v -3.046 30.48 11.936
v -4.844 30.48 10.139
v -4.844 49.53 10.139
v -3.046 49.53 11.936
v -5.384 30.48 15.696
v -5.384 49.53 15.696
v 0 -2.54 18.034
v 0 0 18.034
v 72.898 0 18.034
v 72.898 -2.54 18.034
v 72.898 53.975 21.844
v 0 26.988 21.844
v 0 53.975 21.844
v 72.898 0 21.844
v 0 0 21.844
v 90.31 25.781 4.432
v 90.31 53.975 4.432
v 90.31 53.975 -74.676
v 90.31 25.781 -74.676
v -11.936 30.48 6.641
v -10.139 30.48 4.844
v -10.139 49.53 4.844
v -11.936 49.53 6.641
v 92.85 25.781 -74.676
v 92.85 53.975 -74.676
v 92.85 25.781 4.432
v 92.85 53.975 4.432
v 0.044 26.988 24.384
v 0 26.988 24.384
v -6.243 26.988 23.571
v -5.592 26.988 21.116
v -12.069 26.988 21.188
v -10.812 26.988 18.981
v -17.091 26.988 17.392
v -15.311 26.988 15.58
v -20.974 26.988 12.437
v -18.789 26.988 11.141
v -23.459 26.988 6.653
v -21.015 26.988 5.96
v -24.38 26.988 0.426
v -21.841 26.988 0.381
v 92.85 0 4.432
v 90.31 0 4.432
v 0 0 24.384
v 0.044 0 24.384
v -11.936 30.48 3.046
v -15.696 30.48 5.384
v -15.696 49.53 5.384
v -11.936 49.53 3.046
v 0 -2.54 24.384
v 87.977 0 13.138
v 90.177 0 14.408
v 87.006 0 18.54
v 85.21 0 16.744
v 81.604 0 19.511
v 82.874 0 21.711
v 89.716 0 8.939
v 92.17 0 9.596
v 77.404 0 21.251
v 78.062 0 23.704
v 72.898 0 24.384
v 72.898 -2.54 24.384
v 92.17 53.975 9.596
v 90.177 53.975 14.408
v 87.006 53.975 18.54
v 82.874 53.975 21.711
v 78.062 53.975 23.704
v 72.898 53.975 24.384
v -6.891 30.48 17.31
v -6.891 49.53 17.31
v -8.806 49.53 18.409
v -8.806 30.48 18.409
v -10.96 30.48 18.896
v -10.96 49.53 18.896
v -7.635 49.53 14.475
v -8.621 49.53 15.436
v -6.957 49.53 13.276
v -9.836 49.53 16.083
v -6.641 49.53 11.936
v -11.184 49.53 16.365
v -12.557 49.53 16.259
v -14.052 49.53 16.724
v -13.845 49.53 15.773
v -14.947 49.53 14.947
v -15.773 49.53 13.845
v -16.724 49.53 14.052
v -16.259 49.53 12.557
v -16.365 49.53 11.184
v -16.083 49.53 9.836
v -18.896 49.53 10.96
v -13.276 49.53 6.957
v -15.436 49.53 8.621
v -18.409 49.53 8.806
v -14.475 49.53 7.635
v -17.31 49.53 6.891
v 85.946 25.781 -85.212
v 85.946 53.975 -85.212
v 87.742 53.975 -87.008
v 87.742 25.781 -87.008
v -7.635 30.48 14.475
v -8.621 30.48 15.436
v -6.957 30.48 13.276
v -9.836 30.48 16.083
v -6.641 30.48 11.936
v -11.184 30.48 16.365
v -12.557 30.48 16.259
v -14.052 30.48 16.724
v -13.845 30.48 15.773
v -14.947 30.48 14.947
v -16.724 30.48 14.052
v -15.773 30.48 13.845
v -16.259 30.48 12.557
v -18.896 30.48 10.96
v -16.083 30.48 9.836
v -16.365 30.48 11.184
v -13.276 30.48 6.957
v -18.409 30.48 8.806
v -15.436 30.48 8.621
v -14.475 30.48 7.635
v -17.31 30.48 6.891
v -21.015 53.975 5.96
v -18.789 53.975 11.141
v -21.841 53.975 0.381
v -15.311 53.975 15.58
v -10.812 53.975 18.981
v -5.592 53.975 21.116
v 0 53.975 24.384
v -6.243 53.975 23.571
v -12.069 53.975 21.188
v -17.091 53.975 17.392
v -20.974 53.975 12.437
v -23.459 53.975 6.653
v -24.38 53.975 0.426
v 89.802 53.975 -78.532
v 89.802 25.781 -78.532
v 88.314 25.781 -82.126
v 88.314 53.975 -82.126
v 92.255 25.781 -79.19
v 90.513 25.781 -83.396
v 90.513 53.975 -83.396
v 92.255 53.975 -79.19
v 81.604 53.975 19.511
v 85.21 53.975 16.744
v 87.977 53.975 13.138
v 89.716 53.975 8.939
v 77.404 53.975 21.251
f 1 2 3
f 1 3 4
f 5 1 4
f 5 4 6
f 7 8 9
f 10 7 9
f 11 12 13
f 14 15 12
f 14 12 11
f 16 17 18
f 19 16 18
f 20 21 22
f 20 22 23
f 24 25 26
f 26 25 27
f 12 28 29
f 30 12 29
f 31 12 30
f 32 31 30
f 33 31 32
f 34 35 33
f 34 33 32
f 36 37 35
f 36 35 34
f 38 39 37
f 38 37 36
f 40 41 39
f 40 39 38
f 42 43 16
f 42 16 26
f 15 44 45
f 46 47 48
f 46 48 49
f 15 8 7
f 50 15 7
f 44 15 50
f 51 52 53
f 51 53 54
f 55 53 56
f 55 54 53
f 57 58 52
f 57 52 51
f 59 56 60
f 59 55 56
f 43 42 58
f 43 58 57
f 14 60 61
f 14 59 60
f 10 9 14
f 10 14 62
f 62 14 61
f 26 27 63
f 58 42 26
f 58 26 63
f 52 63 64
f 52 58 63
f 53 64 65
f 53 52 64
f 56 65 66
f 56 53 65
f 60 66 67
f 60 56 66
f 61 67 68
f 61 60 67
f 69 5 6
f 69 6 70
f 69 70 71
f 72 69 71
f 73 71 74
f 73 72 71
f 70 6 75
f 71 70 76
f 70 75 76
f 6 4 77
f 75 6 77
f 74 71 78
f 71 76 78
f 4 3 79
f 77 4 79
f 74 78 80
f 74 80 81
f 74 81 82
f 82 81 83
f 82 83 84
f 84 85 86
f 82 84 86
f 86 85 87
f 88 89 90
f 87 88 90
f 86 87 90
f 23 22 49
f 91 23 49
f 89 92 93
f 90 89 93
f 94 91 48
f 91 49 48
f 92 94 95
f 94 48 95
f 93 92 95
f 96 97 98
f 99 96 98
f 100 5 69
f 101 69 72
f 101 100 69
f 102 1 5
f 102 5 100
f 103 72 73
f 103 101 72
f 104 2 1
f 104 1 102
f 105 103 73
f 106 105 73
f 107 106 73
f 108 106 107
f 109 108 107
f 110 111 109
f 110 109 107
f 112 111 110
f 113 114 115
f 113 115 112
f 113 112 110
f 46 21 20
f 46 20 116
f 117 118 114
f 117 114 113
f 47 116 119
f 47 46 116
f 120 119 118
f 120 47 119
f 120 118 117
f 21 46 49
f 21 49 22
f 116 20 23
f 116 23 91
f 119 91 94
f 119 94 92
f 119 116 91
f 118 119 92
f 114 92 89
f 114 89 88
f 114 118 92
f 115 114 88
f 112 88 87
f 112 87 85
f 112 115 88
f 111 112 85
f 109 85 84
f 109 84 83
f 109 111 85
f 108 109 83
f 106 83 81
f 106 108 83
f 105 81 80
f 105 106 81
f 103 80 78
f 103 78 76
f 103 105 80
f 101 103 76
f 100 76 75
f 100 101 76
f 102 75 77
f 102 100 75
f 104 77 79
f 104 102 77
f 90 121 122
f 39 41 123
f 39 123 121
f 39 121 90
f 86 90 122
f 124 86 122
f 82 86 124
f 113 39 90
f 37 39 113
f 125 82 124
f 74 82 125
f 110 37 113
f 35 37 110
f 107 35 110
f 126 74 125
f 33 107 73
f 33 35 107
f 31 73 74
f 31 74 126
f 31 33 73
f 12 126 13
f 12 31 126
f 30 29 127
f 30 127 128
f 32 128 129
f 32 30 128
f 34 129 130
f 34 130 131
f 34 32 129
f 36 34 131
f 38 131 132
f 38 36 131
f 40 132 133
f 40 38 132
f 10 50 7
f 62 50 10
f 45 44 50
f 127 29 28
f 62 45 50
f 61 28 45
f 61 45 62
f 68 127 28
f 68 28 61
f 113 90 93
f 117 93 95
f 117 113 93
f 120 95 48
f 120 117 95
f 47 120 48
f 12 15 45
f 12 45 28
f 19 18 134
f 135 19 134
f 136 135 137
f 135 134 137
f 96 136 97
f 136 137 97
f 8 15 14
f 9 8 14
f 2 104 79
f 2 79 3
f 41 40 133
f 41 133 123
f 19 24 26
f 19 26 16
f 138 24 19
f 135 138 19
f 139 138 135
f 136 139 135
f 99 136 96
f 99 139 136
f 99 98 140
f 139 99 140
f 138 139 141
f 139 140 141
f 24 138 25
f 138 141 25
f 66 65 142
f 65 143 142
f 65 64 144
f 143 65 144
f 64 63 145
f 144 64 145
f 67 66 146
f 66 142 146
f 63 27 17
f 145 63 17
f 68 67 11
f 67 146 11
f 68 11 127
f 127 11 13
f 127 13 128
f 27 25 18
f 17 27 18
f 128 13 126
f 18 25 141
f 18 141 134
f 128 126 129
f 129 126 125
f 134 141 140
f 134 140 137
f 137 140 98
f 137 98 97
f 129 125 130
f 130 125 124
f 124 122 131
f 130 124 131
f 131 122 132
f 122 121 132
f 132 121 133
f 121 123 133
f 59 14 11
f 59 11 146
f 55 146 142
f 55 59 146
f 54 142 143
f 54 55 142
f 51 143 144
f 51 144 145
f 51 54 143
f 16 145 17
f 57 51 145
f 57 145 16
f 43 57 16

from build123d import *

# Parameters (mm, degrees)
EXTRUDE_THIN1_DEPTH = 53.975
BOSS_EXTRUDE1_START = 30.48
BOSS_EXTRUDE1_DEPTH = 19.05
SKETCH12_W          = 34.867415814
SKETCH12_H          = 30.456007234
CUT_EXTRUDE1_DEPTH  = 27.000736901
BOSS_EXTRUDE2_DEPTH = 28.194
SKETCH15_W          = 72.898
SKETCH15_H          = 6.35
BOSS_EXTRUDE3_DEPTH = 2.54


with BuildPart() as part:
    # Sketch8 → Extrude-Thin1 (new body)
    with BuildSketch(Plane(origin=(0, 0, 0), x_dir=(1, 0, 0), z_dir=(0, 1, 0))):
        with BuildLine():
            ThreePointArc((-21.840673053, -0.381230366), (-15.310661969, -15.580242811), (0, -21.844))
            Line((0, -21.844), (72.898, -21.844))
            ThreePointArc((72.898, -21.844), (85.209931142, -16.744231142), (90.3097, -4.4323))
            Line((90.3097, -4.4323), (92.8497, -4.4323))
            ThreePointArc((92.8497, -4.4323), (87.005982366, -18.540282366), (72.898, -24.384))
            Line((72.898, -24.384), (0, -24.384))
            ThreePointArc((0, -24.384), (-17.090971501, -17.391898952), (-24.380286199, -0.425559479))
            Line((-24.380286199, -0.425559479), (-21.840673053, -0.381230366))
        make_face()
    extrude(amount=EXTRUDE_THIN1_DEPTH)

    # Sketch10 → Boss-Extrude1 (add)
    with BuildSketch(Plane(origin=(0, 0, 0), x_dir=(1, 0, 0), z_dir=(0, 1, 0)).offset(BOSS_EXTRUDE1_START)):
        with BuildLine():
            Line((-6.641231784, -11.936352934), (-4.843541474, -10.138662625))
            Line((-4.843541474, -10.138662625), (-3.045851165, -11.936352934))
            Line((-3.045851165, -11.936352934), (-5.383859486, -15.696211745))
            ThreePointArc((-5.383859486, -15.696211745), (-7.807213542, -17.931410627), (-10.959862847, -18.895548216))
            ThreePointArc((-10.959862847, -18.895548216), (-15.446040528, -15.446040528), (-18.895548216, -10.959862847))
            ThreePointArc((-18.895548216, -10.959862847), (-17.931410627, -7.807213542), (-15.696211745, -5.383859486))
            Line((-15.696211745, -5.383859486), (-11.936352934, -3.045851165))
            Line((-11.936352934, -3.045851165), (-10.138662625, -4.843541474))
            Line((-10.138662625, -4.843541474), (-11.936352934, -6.641231784))
            ThreePointArc((-11.936352934, -6.641231784), (-14.946738288, -14.946738288), (-6.641231784, -11.936352934))
        make_face()
    extrude(amount=BOSS_EXTRUDE1_DEPTH)

    # Sketch12 → Cut-Extrude1 (cut, through all)
    with BuildSketch(Plane(origin=(0, 0, 0), x_dir=(-0.999847695, 0, 0.017452406), z_dir=(-0.017452406, 0, -0.999847695))):
        with Locations((17.814938273, 11.759496383)):
            Rectangle(SKETCH12_W, SKETCH12_H)
    extrude(amount=-CUT_EXTRUDE1_DEPTH, mode=Mode.SUBTRACT)

    # Sketch14 → Boss-Extrude2 (add)
    with BuildSketch(Plane(origin=(0, 53.975, 0), x_dir=(1, 0, 0), z_dir=(0, 1, 0))):
        with BuildLine():
            Line((85.945696481, 85.211636481), (87.741747705, 87.007687705))
            ThreePointArc((87.741747705, 87.007687705), (91.52218645, 81.349861294), (92.8497, 74.676))
            Line((92.8497, 74.676), (92.8497, -4.4323))
            Line((92.8497, -4.4323), (90.3097, -4.4323))
            Line((90.3097, -4.4323), (90.3097, 74.676))
            ThreePointArc((90.3097, 74.676), (89.175532438, 80.377845376), (85.945696481, 85.211636481))
        make_face()
    extrude(amount=-BOSS_EXTRUDE2_DEPTH)

    # Sketch15 → Boss-Extrude3 (add)
    with BuildSketch(Plane.XZ):
        with Locations((36.449, 21.209)):
            Rectangle(SKETCH15_W, SKETCH15_H)
    extrude(amount=BOSS_EXTRUDE3_DEPTH)


solid = part.part
